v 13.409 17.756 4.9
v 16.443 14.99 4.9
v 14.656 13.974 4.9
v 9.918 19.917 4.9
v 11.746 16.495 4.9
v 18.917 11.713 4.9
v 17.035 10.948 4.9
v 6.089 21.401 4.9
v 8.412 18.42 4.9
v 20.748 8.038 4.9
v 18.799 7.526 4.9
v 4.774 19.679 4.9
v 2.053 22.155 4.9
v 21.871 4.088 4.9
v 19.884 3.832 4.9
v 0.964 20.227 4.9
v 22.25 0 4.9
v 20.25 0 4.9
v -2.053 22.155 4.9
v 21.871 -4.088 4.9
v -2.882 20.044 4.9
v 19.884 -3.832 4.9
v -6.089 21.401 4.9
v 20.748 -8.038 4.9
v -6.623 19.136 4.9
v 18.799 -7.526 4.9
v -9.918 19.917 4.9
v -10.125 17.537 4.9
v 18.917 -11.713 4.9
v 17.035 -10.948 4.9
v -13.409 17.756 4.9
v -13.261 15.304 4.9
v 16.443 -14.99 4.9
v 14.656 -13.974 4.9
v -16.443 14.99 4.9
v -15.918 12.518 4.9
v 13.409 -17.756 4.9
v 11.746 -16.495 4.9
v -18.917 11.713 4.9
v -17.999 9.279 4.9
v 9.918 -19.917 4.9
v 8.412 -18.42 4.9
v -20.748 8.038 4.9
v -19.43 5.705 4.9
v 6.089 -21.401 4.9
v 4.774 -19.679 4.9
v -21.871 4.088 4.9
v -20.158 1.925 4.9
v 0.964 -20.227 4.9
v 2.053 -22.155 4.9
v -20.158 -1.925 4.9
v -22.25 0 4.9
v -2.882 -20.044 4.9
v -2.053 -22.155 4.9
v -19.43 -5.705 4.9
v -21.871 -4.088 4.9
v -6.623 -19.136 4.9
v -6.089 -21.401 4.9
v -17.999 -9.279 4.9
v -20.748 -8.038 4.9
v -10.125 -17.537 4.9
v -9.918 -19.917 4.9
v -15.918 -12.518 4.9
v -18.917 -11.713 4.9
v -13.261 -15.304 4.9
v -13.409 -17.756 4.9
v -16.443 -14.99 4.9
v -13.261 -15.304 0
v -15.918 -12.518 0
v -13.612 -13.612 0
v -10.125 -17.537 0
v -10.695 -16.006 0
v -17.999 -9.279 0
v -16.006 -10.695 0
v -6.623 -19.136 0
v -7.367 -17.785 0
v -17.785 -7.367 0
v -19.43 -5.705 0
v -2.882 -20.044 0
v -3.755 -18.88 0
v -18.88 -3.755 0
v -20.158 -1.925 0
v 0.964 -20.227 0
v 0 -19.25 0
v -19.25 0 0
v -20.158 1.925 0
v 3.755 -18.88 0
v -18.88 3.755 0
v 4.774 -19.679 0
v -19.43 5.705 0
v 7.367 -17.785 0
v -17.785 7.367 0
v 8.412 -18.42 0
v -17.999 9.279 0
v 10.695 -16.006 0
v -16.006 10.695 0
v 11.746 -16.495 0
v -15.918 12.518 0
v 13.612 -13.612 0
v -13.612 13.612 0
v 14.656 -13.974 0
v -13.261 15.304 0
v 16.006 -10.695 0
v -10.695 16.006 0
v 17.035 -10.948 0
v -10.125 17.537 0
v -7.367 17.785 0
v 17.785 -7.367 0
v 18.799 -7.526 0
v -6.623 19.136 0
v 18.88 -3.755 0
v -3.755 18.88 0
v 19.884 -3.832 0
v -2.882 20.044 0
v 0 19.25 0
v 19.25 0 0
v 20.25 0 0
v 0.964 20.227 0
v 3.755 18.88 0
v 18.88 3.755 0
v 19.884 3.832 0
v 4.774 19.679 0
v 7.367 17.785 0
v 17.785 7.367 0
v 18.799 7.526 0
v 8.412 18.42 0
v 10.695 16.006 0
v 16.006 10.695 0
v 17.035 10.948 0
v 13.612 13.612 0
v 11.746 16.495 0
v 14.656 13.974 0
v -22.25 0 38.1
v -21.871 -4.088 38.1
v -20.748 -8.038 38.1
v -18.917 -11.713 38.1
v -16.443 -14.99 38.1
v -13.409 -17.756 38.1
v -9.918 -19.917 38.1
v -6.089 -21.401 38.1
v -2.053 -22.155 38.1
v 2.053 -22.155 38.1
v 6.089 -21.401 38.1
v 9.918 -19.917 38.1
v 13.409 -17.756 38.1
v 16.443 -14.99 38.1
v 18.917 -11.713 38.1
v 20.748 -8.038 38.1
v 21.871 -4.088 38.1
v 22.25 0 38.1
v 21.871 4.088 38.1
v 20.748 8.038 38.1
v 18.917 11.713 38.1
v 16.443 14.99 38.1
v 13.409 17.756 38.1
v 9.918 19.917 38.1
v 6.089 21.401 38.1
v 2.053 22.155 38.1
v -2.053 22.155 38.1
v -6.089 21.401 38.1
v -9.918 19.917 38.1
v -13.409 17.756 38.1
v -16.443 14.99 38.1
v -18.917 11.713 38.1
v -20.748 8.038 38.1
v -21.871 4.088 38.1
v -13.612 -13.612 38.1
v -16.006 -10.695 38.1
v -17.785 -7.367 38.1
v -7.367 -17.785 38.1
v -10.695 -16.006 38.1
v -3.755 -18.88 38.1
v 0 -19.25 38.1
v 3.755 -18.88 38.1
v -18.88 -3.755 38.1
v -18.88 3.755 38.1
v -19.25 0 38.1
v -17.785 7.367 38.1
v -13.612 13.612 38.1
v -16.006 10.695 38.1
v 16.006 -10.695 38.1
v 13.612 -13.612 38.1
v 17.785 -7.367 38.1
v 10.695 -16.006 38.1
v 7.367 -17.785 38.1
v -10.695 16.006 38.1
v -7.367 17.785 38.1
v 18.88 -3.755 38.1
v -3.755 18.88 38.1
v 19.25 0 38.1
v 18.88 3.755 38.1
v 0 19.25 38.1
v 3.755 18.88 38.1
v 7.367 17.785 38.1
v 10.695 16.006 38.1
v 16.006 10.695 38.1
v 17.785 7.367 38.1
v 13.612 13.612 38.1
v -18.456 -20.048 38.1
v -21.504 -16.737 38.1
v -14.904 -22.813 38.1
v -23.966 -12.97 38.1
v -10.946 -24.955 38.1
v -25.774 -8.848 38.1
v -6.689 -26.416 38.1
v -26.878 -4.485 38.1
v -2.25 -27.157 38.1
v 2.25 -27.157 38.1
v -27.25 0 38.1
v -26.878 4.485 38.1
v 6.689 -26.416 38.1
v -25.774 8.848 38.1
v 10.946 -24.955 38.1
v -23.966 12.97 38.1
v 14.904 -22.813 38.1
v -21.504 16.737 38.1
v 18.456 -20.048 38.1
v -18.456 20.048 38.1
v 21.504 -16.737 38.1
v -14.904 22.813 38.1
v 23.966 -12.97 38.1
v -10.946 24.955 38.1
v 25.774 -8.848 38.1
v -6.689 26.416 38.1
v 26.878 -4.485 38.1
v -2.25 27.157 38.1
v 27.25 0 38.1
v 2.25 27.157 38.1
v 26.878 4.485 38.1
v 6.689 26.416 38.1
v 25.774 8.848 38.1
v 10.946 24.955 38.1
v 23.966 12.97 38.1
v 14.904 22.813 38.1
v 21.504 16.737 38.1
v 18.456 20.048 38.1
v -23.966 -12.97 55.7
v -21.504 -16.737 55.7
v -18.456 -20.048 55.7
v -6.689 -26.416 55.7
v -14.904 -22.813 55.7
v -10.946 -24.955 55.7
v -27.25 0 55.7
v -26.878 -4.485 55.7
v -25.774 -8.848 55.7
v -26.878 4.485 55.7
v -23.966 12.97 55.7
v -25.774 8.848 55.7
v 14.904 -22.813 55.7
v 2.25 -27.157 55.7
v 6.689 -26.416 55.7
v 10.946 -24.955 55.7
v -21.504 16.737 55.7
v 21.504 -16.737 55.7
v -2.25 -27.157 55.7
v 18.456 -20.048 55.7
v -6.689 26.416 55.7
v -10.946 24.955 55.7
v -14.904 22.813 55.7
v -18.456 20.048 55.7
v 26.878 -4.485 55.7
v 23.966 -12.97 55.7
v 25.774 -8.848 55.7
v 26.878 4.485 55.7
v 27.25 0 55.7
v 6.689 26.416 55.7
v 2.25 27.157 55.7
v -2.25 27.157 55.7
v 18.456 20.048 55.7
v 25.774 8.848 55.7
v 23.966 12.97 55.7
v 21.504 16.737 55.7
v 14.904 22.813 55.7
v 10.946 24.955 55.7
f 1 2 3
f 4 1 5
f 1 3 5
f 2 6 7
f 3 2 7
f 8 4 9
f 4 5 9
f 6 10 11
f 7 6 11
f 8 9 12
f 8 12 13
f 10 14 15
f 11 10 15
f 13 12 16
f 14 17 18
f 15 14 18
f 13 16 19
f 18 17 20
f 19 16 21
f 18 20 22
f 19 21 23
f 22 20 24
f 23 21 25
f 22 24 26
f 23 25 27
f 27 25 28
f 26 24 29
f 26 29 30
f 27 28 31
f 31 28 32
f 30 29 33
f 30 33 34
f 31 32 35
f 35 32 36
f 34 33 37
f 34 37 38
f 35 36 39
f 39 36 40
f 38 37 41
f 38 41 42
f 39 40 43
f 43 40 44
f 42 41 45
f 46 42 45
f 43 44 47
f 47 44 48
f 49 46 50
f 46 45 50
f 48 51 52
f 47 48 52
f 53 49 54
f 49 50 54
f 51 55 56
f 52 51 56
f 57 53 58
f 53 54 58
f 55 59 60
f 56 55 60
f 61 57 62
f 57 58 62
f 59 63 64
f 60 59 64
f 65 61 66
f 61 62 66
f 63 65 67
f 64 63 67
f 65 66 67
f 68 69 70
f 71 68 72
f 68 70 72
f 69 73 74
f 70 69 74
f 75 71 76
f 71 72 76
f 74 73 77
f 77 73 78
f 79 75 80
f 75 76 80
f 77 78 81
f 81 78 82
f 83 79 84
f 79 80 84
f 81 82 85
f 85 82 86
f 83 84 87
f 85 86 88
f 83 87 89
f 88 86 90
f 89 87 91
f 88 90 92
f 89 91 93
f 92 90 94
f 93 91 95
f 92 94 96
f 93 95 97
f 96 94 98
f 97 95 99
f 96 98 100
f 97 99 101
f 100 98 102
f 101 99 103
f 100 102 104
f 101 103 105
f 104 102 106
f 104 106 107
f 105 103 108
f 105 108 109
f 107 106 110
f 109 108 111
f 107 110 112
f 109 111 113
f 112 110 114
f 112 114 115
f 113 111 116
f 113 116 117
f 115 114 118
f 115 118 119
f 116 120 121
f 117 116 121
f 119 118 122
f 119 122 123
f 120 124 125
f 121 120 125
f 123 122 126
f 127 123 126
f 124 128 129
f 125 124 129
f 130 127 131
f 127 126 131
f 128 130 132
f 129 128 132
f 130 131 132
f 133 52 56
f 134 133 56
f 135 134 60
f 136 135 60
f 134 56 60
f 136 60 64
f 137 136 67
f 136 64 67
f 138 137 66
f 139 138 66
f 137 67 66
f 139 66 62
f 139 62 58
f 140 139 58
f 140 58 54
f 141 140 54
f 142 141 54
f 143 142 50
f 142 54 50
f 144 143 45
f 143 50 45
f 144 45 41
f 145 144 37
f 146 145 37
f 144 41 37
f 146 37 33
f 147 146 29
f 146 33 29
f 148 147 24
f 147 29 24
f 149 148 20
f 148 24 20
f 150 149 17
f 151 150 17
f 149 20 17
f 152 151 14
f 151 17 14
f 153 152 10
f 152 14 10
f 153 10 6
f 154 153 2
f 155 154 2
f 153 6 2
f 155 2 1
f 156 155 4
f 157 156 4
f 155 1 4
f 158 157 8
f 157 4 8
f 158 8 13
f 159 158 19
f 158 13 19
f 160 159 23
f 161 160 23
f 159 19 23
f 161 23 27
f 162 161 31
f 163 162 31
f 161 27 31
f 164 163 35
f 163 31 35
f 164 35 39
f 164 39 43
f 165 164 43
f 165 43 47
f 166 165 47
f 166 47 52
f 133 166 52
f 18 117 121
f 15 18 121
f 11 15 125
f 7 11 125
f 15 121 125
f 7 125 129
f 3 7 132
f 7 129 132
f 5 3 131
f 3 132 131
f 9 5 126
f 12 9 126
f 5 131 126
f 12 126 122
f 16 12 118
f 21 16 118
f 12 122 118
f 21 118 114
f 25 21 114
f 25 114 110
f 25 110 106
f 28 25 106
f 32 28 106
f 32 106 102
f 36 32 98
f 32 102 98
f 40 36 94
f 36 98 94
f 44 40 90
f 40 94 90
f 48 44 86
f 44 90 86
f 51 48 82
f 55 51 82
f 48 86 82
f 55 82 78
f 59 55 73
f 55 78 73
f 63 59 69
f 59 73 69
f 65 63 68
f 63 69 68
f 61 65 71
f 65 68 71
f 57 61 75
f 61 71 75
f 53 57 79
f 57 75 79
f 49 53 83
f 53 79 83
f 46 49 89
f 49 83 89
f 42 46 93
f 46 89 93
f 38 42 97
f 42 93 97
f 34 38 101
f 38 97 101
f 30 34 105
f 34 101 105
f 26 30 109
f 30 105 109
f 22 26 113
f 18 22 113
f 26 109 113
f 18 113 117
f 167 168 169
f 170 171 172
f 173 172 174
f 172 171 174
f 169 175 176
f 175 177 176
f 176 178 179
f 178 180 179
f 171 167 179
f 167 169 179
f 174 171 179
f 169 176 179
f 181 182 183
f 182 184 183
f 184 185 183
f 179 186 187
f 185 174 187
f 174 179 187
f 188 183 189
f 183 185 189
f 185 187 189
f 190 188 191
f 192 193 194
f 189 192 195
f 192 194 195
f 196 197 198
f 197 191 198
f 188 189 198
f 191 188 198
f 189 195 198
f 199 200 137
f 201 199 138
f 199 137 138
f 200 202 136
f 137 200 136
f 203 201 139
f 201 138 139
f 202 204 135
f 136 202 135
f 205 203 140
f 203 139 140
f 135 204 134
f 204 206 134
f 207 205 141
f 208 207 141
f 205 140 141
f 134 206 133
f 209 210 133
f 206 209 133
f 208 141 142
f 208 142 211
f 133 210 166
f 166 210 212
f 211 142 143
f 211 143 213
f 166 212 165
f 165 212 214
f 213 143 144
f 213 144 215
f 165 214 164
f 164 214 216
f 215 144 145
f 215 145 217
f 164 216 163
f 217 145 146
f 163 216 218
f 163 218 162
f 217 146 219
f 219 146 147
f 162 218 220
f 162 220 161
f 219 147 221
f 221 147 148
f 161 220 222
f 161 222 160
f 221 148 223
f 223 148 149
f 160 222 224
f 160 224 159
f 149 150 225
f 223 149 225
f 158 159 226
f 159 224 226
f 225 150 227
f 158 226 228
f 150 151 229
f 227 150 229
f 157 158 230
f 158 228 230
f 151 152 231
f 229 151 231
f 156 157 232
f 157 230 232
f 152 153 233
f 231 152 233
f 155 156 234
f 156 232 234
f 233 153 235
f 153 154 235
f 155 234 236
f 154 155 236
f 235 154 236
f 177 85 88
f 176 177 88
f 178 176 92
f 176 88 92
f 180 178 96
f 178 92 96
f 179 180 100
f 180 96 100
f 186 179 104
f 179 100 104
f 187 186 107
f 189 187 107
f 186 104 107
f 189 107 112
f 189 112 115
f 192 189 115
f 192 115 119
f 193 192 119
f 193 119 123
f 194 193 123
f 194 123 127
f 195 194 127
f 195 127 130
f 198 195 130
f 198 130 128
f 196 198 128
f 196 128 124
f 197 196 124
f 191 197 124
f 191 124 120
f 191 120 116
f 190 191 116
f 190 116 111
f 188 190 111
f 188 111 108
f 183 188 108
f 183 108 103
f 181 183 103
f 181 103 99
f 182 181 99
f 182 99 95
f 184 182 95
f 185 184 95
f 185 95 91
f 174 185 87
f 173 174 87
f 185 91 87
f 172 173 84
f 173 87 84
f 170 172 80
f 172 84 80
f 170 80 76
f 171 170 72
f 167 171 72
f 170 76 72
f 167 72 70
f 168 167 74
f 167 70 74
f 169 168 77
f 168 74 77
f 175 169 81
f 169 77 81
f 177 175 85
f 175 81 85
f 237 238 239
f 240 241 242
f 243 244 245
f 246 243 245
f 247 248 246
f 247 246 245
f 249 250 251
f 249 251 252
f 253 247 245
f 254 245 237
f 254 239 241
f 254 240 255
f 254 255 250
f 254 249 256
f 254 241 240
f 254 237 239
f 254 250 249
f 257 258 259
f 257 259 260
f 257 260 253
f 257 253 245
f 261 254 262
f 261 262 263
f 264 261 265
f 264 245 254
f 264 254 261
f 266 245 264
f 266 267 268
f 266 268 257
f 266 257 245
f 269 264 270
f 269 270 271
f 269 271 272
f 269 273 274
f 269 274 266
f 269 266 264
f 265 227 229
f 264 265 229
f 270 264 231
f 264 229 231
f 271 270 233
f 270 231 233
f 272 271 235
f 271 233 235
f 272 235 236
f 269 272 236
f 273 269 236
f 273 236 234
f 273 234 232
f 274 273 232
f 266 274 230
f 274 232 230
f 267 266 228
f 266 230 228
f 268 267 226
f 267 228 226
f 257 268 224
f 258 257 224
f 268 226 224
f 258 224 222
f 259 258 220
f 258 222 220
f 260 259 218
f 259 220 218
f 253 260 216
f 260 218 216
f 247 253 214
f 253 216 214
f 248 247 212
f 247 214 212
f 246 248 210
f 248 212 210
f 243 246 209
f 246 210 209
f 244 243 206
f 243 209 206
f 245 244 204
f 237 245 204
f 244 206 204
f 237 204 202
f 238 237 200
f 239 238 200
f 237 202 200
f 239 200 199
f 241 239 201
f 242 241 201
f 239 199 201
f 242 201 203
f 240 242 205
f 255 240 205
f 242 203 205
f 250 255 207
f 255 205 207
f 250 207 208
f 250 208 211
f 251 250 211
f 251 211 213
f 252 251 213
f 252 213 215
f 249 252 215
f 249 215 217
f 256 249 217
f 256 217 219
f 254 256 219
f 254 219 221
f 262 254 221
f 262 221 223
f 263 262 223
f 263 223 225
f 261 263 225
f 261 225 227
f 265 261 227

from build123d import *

# Parameters (mm, degrees)
SKETCH1_R           = 20.25
BOSS_EXTRUDE1_DEPTH = 4.9
SKETCH2_R           = 22.25
BOSS_EXTRUDE2_DEPTH = 33.2
SKETCH4_R           = 19.25
CUT_EXTRUDE2_DEPTH  = 58.2
SKETCH5_R           = 27.25
BOSS_EXTRUDE3_DEPTH = 17.6


with BuildPart() as part:
    # Sketch1 → Boss-Extrude1 (new body)
    with BuildSketch(Plane.XY):
        Circle(SKETCH1_R)
    extrude(amount=BOSS_EXTRUDE1_DEPTH)

    # Sketch2 → Boss-Extrude2 (add)
    with BuildSketch(Plane.XY.offset(4.9)):
        with Locations(Location((0, 0, 0), (0, 0, 180))):
            Circle(SKETCH2_R)
    extrude(amount=BOSS_EXTRUDE2_DEPTH)

    # Sketch4 → Cut-Extrude2 (cut)
    with BuildSketch(Plane(origin=(0, 0, 0), x_dir=(-1, 0, 0), z_dir=(0, 0, -1))):
        Circle(SKETCH4_R)
    extrude(amount=-CUT_EXTRUDE2_DEPTH, mode=Mode.SUBTRACT)

    # Sketch5 → Boss-Extrude3 (add)
    with BuildSketch(Plane.XY.offset(38.1)):
        Circle(SKETCH5_R)
    extrude(amount=BOSS_EXTRUDE3_DEPTH)


solid = part.part
